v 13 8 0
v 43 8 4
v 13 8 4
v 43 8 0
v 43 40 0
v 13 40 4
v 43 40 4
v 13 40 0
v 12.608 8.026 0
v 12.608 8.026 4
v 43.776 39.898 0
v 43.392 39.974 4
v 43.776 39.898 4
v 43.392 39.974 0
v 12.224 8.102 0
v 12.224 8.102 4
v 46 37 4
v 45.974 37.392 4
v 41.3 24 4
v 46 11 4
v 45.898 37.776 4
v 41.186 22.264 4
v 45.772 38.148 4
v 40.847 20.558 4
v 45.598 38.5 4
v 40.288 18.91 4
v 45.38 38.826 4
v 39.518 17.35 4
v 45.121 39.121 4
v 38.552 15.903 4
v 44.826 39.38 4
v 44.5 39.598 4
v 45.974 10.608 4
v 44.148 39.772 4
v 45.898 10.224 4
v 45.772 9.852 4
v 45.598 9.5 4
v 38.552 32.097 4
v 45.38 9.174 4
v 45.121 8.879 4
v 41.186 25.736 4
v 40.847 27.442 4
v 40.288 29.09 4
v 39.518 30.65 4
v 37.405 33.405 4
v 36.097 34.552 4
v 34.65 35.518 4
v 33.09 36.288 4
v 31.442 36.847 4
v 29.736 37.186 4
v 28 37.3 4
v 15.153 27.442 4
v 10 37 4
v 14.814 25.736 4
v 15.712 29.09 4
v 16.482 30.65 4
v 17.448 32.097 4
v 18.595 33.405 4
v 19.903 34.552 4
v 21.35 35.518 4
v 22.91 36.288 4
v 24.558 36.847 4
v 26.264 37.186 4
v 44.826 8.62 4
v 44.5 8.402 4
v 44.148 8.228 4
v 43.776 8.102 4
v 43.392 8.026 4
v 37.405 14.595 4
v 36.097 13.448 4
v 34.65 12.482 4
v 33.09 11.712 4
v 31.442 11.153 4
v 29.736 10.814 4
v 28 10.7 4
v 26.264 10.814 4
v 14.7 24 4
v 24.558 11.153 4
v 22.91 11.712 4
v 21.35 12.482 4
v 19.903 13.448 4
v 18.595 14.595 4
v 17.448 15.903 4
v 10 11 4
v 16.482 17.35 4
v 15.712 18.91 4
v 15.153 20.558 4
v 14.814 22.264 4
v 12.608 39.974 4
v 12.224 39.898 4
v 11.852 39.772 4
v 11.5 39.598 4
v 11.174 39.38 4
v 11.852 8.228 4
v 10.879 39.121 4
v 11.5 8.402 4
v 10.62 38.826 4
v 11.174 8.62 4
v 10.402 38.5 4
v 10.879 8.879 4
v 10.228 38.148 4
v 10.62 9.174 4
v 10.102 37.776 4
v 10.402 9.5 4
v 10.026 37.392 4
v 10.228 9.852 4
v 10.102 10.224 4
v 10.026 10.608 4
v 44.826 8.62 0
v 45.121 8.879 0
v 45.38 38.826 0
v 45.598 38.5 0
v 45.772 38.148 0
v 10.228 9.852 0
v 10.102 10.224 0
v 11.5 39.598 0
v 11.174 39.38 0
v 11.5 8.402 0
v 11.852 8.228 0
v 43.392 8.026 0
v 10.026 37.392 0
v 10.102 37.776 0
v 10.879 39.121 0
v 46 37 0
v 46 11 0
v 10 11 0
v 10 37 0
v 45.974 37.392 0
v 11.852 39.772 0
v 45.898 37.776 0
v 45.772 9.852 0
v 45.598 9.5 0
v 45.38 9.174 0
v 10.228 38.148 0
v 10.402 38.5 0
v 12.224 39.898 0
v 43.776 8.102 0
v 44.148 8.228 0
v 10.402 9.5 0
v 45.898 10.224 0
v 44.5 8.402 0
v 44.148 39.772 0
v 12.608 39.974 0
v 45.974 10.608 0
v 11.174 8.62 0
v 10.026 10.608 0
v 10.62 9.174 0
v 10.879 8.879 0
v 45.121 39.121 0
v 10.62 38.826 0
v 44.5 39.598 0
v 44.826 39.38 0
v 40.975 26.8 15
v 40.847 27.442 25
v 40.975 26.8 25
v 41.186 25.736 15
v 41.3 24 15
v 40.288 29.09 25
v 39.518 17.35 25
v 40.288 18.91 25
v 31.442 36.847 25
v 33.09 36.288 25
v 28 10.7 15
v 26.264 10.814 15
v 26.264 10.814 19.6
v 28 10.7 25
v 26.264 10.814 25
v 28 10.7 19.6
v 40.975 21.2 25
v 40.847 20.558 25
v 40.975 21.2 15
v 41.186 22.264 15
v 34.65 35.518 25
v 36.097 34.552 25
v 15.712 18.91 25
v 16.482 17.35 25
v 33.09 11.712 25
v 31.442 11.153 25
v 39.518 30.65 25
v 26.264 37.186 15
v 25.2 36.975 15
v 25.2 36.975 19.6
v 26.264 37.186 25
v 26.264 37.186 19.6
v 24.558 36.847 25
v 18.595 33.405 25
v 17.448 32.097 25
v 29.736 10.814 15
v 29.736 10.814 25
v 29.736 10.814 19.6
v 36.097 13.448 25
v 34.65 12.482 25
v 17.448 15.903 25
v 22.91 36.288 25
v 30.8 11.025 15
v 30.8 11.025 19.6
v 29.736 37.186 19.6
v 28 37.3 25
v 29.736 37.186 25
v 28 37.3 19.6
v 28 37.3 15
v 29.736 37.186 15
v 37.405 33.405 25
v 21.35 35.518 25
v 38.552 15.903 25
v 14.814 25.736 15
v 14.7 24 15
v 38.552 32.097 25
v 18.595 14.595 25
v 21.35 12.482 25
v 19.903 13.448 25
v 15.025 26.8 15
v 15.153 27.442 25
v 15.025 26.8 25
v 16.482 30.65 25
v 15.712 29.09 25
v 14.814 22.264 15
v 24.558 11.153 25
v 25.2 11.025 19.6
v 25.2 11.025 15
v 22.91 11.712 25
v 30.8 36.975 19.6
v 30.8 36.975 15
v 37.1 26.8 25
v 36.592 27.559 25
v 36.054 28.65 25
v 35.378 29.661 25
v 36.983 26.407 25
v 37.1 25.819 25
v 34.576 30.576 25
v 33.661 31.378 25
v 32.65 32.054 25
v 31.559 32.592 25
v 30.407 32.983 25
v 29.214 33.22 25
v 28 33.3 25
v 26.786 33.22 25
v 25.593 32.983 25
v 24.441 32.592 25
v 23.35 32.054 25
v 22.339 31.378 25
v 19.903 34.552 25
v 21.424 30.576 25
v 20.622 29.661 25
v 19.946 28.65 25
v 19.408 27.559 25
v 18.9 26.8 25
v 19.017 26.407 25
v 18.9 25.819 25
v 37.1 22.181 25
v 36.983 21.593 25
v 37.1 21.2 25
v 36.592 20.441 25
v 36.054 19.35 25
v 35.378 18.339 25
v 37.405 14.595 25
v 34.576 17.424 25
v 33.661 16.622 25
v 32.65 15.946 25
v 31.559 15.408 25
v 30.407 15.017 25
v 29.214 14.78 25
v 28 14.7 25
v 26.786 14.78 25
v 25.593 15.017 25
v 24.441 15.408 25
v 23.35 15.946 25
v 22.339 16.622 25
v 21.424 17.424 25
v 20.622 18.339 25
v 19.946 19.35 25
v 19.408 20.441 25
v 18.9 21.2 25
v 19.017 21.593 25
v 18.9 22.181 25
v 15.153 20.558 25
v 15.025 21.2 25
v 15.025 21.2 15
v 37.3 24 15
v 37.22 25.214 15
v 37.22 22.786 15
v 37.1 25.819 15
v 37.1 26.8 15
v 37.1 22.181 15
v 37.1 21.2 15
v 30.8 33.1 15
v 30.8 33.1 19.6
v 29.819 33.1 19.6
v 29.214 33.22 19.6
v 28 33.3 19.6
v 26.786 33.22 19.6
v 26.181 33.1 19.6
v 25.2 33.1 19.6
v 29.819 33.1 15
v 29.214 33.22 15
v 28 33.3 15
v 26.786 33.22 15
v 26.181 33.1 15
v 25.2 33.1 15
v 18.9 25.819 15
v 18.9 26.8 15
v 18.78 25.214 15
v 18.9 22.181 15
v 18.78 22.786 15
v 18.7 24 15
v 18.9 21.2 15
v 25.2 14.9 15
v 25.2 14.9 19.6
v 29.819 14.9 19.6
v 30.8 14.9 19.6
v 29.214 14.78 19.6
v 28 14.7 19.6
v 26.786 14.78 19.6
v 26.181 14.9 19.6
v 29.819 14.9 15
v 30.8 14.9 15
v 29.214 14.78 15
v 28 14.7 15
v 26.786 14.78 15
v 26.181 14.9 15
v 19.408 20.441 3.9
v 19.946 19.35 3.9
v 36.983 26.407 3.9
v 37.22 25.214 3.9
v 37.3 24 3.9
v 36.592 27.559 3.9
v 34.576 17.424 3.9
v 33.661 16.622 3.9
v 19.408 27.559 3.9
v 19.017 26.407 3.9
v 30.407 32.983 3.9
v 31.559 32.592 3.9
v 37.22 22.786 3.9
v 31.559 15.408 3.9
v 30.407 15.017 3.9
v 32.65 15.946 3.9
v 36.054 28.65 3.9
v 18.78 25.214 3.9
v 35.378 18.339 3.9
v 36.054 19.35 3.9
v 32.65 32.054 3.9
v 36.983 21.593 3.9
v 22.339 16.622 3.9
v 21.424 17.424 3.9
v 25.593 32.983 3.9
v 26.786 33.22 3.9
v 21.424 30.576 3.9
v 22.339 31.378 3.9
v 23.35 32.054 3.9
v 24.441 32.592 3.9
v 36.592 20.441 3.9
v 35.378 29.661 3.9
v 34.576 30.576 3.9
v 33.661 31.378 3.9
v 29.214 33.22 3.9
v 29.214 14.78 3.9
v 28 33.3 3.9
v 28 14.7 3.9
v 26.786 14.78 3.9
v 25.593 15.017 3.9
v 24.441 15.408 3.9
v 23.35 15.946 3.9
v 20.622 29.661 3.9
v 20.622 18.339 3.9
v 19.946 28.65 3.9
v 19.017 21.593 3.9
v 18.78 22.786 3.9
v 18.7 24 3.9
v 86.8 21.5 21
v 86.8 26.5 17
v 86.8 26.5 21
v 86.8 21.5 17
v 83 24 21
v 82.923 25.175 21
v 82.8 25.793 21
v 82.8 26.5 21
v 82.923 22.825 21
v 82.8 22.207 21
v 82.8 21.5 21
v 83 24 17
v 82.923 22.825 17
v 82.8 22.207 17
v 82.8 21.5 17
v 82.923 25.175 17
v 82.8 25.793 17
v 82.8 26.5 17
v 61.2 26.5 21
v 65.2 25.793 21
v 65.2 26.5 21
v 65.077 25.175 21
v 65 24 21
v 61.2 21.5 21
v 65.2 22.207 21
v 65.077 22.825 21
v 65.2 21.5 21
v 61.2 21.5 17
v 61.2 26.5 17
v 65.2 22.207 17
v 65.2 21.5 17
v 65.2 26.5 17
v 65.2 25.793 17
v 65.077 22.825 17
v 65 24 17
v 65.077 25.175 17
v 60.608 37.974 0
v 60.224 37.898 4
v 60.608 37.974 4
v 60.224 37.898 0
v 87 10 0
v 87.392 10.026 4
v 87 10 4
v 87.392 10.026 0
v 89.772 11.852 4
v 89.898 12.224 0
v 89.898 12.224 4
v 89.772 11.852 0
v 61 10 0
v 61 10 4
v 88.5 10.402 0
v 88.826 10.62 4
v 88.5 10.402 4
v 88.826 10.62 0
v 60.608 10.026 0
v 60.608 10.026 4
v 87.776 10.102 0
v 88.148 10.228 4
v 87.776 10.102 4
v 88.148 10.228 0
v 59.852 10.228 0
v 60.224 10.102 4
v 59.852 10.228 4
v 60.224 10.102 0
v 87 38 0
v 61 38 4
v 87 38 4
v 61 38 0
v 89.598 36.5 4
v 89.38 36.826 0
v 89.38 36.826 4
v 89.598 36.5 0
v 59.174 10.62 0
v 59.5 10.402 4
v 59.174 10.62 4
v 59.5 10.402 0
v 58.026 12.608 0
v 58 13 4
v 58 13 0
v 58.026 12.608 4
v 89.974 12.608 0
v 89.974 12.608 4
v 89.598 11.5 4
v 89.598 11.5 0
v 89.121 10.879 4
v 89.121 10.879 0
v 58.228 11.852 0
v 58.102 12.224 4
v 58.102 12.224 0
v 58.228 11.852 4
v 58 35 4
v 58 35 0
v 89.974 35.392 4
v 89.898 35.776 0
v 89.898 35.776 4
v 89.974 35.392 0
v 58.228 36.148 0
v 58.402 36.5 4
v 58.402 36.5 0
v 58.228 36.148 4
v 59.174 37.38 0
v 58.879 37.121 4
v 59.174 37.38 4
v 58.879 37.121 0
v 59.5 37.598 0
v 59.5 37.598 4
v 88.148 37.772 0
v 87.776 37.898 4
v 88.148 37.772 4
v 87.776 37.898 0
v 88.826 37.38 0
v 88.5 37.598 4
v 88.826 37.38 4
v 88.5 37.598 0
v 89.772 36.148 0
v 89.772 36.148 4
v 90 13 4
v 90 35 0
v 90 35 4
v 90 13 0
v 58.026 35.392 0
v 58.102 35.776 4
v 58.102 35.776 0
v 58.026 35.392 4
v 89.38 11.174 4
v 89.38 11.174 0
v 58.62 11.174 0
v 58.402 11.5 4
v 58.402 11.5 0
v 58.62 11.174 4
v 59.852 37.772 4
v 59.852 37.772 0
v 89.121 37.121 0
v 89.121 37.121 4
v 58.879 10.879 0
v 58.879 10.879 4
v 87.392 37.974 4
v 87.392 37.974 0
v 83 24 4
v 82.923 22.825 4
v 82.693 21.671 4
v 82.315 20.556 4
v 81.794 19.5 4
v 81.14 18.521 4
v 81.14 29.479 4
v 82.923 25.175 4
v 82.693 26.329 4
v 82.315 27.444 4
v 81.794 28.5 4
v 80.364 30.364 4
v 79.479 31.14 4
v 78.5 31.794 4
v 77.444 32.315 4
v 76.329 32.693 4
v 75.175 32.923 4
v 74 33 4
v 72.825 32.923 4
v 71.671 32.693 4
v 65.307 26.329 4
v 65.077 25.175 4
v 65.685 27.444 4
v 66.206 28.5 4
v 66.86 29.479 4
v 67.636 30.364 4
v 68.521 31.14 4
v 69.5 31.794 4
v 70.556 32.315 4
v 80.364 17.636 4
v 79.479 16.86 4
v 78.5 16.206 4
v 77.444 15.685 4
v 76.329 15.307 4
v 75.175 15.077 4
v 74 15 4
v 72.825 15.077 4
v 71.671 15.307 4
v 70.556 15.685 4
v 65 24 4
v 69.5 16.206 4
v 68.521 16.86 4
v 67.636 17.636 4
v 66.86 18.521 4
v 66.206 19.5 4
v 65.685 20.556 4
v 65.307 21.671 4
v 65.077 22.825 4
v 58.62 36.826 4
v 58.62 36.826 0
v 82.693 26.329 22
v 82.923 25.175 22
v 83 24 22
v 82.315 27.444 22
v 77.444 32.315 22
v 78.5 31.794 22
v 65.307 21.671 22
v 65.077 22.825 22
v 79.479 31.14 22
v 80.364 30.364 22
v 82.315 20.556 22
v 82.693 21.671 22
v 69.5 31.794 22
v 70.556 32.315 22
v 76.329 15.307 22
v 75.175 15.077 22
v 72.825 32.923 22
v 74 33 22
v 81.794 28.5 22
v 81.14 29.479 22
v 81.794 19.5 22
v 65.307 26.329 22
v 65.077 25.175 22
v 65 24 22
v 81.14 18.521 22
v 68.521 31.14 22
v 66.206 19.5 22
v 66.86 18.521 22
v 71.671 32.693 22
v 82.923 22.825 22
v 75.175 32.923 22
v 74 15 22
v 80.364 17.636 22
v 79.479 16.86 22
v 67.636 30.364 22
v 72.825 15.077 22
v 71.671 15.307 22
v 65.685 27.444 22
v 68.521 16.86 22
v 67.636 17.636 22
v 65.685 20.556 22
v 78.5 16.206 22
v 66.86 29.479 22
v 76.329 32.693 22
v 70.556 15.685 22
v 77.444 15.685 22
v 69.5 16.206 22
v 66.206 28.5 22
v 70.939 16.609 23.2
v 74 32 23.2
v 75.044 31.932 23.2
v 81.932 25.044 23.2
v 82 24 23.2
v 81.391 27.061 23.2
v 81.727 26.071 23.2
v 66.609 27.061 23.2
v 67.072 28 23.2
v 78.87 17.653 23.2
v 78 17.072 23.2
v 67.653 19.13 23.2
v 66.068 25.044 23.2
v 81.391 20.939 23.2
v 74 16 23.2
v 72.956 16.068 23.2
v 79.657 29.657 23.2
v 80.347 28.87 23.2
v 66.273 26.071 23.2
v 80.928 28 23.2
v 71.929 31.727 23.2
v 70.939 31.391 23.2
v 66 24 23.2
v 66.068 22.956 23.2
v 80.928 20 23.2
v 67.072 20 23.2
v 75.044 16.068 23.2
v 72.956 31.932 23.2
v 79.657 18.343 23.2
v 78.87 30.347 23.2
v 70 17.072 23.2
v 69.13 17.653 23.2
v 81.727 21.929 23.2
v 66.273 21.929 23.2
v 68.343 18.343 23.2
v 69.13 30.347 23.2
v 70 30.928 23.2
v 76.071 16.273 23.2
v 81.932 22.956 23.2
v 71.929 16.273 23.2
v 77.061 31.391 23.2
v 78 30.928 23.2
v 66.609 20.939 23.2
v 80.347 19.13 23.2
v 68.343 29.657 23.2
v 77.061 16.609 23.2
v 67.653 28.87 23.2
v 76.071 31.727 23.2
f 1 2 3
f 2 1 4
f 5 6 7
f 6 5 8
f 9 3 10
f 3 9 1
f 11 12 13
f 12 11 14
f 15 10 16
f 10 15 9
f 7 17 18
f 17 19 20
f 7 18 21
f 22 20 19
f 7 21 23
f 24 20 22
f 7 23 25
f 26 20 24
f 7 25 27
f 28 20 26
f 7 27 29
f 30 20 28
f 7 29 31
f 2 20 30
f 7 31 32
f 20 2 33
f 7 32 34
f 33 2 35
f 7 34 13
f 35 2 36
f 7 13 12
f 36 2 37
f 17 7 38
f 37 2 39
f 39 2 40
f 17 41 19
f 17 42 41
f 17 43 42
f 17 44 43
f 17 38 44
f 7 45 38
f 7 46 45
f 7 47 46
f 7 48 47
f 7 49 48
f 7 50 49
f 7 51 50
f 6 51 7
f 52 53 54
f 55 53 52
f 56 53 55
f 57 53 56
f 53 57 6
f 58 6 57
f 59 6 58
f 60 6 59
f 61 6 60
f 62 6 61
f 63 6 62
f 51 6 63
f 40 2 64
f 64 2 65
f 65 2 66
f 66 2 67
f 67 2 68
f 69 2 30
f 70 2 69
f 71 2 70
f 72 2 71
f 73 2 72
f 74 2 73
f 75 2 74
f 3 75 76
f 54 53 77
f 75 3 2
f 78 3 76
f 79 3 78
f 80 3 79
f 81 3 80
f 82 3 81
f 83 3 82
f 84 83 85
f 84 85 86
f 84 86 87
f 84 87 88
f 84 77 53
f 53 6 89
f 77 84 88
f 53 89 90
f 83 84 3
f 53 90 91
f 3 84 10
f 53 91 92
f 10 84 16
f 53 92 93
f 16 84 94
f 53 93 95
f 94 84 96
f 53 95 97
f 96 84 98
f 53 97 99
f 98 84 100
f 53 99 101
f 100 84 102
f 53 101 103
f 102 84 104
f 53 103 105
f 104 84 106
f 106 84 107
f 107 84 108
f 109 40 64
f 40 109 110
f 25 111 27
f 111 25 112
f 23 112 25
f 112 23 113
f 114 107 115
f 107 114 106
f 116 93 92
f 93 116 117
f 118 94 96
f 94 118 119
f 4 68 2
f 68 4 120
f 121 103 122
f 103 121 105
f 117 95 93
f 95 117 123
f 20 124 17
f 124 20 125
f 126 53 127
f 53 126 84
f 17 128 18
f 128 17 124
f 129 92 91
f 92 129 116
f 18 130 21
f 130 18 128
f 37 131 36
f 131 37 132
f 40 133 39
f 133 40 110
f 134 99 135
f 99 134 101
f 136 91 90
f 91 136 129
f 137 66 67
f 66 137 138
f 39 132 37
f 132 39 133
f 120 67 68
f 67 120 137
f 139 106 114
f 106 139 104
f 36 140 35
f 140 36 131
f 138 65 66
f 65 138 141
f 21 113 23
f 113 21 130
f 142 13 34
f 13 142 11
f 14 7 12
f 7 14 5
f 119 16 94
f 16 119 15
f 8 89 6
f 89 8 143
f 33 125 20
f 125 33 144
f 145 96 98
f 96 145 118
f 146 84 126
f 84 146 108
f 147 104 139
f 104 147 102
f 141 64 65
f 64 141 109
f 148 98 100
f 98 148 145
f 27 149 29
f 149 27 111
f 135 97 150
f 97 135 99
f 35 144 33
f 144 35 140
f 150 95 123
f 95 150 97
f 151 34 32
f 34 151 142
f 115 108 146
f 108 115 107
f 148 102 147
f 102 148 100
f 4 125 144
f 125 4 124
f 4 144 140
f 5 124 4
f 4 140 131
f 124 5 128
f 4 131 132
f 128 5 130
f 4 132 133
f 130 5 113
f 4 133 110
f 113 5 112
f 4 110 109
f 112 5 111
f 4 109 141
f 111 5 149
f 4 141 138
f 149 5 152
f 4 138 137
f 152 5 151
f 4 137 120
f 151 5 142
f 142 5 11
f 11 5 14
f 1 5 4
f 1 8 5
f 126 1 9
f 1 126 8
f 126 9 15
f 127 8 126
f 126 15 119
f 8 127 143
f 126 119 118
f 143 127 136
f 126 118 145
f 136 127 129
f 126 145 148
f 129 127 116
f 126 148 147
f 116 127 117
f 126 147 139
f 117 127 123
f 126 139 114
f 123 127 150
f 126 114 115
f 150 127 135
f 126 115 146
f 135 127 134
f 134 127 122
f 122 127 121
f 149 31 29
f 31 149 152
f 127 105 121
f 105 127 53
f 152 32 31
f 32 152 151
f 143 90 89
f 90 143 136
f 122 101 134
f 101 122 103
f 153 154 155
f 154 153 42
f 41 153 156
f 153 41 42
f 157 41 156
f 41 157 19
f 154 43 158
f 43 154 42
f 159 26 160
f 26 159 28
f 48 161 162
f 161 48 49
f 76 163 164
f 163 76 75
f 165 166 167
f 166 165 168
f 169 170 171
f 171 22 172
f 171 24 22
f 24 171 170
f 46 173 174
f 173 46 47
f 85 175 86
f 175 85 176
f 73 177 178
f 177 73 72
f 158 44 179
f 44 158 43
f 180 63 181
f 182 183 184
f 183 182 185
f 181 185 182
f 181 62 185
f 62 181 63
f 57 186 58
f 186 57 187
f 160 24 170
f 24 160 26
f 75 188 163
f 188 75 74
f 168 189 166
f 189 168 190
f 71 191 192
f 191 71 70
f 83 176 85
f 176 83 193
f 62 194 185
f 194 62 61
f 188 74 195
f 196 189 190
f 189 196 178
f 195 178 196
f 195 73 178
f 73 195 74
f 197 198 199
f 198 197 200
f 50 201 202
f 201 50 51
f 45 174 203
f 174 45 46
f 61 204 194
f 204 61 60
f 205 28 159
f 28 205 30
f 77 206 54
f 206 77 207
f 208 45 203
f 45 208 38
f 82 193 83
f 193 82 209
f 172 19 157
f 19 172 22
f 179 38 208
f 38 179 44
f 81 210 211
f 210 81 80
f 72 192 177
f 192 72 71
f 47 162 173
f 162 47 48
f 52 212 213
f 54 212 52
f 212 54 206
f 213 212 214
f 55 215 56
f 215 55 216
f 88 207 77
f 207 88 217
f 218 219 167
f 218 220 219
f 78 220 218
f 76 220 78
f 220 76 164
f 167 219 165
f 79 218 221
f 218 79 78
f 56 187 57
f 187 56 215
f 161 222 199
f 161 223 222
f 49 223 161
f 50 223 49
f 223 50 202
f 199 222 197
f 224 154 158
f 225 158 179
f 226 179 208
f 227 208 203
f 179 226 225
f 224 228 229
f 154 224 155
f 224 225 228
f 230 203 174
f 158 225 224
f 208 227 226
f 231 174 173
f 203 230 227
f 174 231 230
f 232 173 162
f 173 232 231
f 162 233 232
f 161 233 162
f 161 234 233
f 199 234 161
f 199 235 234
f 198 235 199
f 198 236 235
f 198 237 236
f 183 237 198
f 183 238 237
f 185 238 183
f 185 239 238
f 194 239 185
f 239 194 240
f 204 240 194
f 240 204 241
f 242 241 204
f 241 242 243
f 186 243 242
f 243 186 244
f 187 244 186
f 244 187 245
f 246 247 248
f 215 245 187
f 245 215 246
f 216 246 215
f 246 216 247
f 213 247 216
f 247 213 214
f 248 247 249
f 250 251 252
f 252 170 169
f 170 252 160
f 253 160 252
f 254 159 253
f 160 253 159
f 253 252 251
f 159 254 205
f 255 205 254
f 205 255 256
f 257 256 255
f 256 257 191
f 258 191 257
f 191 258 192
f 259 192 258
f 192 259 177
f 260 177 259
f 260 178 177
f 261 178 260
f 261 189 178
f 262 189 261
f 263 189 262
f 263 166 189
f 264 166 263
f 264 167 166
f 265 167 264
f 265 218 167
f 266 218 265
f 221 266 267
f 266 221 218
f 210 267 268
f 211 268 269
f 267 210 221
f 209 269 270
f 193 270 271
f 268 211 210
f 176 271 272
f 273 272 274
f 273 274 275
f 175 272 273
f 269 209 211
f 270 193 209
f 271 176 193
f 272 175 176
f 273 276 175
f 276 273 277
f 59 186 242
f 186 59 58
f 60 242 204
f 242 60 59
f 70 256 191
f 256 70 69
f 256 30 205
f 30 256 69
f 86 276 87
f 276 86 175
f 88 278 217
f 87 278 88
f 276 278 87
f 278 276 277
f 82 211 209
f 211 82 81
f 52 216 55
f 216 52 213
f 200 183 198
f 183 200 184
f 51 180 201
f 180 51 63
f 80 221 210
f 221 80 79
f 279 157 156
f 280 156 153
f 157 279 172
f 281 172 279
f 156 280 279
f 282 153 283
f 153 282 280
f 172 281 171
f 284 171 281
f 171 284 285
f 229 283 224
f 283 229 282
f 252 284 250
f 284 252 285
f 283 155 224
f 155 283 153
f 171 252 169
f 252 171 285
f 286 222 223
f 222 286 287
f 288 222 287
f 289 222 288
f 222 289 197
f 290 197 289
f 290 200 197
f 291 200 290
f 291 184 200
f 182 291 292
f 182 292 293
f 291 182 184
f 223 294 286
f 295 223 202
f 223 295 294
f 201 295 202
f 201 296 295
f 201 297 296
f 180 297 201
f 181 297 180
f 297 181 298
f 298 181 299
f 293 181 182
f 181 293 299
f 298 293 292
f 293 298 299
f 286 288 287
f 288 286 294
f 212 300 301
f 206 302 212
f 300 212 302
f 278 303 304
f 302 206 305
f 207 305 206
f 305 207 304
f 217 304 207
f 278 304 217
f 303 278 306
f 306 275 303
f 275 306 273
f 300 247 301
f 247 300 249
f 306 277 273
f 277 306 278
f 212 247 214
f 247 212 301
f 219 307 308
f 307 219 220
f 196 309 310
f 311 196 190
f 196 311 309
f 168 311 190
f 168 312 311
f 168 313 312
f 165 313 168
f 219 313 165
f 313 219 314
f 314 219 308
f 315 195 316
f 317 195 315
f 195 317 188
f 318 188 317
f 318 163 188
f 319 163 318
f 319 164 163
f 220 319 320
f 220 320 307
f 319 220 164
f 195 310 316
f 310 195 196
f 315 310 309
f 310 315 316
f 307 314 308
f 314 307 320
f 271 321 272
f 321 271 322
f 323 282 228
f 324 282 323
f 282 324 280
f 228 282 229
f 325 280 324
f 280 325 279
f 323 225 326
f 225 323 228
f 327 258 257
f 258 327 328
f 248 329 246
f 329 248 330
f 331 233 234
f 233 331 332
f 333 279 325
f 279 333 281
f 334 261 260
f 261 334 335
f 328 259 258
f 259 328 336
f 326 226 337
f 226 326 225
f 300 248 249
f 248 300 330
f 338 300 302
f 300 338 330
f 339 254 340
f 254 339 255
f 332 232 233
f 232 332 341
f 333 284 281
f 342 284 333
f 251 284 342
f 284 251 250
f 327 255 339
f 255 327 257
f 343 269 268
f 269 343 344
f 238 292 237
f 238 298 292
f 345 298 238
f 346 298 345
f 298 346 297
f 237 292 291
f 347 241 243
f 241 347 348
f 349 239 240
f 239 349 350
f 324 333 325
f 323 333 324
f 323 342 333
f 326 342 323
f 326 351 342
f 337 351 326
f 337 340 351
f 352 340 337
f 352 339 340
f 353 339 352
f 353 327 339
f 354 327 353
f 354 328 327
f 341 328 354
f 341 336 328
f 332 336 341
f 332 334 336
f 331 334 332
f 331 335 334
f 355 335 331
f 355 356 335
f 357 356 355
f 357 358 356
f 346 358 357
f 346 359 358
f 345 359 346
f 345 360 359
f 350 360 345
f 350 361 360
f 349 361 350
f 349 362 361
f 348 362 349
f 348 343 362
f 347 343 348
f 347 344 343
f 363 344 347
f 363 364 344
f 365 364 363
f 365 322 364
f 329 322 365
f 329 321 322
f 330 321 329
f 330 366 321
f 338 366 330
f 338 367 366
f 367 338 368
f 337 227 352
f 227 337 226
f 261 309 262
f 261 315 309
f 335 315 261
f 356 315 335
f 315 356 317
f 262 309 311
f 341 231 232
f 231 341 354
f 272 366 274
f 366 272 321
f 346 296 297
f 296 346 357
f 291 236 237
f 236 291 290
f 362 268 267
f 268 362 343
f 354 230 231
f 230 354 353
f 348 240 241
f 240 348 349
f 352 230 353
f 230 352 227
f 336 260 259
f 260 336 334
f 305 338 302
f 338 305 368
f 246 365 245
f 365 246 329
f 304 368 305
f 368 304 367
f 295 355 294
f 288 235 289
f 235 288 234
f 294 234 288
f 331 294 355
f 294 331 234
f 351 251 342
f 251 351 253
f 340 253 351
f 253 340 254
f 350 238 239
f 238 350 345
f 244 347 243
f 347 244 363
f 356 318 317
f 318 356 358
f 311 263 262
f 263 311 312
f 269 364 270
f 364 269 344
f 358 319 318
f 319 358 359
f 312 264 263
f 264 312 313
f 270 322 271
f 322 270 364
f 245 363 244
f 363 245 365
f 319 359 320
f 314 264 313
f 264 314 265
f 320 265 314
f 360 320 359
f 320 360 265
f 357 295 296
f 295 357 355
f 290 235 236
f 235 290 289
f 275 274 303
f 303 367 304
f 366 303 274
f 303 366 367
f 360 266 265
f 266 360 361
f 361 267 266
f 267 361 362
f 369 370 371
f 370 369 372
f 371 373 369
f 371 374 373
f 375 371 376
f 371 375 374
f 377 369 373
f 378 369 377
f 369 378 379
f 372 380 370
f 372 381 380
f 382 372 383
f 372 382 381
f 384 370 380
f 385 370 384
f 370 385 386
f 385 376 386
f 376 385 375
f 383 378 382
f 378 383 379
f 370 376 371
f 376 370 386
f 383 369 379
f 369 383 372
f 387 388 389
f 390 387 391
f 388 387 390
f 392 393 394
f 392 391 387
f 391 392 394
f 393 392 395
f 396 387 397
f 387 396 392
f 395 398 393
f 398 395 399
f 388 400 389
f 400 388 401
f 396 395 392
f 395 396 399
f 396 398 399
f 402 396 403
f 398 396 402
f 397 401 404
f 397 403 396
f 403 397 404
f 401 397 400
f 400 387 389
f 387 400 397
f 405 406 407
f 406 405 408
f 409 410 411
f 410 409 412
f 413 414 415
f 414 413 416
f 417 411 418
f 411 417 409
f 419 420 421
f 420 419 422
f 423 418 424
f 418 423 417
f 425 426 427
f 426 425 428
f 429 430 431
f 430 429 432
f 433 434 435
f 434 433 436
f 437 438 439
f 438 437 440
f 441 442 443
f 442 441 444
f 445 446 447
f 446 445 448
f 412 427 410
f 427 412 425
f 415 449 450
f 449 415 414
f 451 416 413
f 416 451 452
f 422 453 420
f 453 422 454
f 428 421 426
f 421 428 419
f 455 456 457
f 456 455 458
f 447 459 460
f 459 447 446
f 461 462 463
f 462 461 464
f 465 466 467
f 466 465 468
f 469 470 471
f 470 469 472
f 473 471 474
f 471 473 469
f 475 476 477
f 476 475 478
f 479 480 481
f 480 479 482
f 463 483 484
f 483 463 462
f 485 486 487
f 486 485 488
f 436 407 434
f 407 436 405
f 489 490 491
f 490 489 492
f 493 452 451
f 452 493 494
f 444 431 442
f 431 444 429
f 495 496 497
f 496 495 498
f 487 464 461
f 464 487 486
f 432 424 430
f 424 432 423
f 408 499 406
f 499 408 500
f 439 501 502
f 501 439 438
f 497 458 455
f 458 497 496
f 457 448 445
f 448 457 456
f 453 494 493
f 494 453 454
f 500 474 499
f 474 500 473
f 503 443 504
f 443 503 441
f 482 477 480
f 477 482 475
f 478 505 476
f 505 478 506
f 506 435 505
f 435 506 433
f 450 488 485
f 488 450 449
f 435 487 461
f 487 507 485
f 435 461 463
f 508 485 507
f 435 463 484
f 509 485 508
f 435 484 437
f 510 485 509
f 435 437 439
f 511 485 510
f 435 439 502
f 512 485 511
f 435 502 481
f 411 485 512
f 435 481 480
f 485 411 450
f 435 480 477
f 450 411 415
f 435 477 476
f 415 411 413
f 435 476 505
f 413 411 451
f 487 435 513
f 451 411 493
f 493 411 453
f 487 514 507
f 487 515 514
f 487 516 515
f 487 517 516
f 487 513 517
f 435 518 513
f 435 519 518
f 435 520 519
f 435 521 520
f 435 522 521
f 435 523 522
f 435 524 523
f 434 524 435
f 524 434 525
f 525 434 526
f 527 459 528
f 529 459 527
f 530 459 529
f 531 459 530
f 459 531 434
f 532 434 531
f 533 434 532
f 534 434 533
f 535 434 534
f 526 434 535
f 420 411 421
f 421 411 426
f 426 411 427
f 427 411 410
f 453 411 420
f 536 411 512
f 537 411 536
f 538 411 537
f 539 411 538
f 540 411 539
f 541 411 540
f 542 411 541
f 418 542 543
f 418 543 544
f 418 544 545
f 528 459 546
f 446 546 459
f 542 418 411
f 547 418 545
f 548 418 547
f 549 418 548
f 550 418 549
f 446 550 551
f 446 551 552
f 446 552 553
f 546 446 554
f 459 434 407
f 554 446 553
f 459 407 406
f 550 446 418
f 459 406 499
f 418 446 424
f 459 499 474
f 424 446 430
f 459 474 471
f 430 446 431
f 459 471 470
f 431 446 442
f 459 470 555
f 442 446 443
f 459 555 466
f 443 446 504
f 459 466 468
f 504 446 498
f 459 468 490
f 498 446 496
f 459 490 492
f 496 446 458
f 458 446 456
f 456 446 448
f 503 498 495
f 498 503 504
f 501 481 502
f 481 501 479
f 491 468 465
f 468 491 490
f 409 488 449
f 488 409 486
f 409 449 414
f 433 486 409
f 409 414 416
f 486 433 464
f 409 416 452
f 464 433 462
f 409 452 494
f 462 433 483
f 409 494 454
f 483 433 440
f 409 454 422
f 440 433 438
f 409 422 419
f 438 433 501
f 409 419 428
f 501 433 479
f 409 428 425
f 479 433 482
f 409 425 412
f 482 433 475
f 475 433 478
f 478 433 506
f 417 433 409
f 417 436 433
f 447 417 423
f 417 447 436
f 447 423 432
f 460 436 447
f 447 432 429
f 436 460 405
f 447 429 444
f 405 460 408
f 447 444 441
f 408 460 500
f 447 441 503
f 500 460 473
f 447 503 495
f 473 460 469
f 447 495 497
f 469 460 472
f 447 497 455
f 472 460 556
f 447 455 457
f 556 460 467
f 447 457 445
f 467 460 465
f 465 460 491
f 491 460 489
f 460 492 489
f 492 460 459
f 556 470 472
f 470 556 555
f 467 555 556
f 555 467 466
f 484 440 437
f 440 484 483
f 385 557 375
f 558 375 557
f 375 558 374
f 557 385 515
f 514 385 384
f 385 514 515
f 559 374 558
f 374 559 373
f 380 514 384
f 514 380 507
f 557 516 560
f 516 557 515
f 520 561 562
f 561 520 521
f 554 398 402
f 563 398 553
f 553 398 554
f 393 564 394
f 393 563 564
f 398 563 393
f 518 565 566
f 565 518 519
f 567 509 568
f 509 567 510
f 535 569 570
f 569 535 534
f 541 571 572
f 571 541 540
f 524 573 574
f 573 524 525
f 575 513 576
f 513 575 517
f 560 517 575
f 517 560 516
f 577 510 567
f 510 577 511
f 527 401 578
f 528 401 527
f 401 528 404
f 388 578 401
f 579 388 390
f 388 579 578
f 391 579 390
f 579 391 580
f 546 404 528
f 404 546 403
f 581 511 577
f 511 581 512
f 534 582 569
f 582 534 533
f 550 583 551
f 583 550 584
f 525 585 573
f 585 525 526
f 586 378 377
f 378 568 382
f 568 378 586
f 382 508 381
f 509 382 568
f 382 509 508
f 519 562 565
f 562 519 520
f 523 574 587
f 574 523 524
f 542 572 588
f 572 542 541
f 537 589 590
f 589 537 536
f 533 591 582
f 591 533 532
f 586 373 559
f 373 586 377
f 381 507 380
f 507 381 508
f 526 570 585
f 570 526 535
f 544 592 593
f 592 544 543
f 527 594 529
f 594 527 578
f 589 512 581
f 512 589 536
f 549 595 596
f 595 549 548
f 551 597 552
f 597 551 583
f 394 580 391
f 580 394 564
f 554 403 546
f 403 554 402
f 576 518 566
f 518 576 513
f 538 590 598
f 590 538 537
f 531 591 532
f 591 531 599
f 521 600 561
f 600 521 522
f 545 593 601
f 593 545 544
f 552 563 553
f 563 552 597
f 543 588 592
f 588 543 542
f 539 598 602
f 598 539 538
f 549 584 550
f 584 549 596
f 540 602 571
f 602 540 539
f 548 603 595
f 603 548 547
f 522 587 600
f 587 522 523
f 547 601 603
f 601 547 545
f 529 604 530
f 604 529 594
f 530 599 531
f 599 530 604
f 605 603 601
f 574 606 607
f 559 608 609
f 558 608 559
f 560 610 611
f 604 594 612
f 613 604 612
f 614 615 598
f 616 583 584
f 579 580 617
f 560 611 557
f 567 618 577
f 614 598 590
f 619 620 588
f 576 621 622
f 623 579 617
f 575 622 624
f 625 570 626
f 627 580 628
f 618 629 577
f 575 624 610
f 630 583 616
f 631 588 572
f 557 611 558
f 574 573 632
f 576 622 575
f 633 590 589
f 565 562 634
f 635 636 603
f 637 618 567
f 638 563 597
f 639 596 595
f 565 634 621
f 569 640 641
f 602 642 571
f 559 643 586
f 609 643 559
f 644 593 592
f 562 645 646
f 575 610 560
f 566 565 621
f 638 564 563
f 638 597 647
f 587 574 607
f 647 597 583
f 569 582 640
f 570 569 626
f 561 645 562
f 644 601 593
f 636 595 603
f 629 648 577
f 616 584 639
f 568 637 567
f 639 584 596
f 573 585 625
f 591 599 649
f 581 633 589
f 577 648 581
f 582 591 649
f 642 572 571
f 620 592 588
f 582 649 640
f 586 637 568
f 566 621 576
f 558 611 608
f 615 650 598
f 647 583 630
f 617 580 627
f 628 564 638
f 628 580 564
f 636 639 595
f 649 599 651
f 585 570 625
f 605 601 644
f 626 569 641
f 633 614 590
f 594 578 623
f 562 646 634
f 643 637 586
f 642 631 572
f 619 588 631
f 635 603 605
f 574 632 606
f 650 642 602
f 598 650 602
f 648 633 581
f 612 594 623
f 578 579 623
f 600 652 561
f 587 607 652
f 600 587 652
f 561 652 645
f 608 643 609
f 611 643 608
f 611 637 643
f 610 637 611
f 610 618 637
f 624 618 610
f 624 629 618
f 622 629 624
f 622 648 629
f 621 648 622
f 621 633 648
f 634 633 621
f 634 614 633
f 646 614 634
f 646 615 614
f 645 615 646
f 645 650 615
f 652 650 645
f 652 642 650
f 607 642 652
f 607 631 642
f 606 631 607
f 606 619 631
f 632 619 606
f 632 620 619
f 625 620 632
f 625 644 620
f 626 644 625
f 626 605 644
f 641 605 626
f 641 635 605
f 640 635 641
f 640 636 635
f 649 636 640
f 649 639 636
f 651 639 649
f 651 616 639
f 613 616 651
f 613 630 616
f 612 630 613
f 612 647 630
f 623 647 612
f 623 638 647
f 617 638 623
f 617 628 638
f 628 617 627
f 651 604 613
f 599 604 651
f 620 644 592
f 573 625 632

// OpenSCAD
/*
Sample 078: Bajonett-Vierteldrehverschluss — 0,30 mm
Generated from the FDM Mechanical Sample Library.
Units: millimetres.

Override examples:
  openscad -o custom.stl -D 'view="plate"' -D 'render_fn=64' model.scad
  openscad -o preview.png -D 'view="assembly"' model.scad
*/
use <../../../library/fdm_mechanisms.scad>

render_fn = is_undef(render_fn) ? 48 : render_fn;
view = is_undef(view) ? "plate" : view;
$fn = render_fn;

sample_bayonet(
    view=view,
    core_d=18,
    clearance=0.3,
    lug_w=5
);
